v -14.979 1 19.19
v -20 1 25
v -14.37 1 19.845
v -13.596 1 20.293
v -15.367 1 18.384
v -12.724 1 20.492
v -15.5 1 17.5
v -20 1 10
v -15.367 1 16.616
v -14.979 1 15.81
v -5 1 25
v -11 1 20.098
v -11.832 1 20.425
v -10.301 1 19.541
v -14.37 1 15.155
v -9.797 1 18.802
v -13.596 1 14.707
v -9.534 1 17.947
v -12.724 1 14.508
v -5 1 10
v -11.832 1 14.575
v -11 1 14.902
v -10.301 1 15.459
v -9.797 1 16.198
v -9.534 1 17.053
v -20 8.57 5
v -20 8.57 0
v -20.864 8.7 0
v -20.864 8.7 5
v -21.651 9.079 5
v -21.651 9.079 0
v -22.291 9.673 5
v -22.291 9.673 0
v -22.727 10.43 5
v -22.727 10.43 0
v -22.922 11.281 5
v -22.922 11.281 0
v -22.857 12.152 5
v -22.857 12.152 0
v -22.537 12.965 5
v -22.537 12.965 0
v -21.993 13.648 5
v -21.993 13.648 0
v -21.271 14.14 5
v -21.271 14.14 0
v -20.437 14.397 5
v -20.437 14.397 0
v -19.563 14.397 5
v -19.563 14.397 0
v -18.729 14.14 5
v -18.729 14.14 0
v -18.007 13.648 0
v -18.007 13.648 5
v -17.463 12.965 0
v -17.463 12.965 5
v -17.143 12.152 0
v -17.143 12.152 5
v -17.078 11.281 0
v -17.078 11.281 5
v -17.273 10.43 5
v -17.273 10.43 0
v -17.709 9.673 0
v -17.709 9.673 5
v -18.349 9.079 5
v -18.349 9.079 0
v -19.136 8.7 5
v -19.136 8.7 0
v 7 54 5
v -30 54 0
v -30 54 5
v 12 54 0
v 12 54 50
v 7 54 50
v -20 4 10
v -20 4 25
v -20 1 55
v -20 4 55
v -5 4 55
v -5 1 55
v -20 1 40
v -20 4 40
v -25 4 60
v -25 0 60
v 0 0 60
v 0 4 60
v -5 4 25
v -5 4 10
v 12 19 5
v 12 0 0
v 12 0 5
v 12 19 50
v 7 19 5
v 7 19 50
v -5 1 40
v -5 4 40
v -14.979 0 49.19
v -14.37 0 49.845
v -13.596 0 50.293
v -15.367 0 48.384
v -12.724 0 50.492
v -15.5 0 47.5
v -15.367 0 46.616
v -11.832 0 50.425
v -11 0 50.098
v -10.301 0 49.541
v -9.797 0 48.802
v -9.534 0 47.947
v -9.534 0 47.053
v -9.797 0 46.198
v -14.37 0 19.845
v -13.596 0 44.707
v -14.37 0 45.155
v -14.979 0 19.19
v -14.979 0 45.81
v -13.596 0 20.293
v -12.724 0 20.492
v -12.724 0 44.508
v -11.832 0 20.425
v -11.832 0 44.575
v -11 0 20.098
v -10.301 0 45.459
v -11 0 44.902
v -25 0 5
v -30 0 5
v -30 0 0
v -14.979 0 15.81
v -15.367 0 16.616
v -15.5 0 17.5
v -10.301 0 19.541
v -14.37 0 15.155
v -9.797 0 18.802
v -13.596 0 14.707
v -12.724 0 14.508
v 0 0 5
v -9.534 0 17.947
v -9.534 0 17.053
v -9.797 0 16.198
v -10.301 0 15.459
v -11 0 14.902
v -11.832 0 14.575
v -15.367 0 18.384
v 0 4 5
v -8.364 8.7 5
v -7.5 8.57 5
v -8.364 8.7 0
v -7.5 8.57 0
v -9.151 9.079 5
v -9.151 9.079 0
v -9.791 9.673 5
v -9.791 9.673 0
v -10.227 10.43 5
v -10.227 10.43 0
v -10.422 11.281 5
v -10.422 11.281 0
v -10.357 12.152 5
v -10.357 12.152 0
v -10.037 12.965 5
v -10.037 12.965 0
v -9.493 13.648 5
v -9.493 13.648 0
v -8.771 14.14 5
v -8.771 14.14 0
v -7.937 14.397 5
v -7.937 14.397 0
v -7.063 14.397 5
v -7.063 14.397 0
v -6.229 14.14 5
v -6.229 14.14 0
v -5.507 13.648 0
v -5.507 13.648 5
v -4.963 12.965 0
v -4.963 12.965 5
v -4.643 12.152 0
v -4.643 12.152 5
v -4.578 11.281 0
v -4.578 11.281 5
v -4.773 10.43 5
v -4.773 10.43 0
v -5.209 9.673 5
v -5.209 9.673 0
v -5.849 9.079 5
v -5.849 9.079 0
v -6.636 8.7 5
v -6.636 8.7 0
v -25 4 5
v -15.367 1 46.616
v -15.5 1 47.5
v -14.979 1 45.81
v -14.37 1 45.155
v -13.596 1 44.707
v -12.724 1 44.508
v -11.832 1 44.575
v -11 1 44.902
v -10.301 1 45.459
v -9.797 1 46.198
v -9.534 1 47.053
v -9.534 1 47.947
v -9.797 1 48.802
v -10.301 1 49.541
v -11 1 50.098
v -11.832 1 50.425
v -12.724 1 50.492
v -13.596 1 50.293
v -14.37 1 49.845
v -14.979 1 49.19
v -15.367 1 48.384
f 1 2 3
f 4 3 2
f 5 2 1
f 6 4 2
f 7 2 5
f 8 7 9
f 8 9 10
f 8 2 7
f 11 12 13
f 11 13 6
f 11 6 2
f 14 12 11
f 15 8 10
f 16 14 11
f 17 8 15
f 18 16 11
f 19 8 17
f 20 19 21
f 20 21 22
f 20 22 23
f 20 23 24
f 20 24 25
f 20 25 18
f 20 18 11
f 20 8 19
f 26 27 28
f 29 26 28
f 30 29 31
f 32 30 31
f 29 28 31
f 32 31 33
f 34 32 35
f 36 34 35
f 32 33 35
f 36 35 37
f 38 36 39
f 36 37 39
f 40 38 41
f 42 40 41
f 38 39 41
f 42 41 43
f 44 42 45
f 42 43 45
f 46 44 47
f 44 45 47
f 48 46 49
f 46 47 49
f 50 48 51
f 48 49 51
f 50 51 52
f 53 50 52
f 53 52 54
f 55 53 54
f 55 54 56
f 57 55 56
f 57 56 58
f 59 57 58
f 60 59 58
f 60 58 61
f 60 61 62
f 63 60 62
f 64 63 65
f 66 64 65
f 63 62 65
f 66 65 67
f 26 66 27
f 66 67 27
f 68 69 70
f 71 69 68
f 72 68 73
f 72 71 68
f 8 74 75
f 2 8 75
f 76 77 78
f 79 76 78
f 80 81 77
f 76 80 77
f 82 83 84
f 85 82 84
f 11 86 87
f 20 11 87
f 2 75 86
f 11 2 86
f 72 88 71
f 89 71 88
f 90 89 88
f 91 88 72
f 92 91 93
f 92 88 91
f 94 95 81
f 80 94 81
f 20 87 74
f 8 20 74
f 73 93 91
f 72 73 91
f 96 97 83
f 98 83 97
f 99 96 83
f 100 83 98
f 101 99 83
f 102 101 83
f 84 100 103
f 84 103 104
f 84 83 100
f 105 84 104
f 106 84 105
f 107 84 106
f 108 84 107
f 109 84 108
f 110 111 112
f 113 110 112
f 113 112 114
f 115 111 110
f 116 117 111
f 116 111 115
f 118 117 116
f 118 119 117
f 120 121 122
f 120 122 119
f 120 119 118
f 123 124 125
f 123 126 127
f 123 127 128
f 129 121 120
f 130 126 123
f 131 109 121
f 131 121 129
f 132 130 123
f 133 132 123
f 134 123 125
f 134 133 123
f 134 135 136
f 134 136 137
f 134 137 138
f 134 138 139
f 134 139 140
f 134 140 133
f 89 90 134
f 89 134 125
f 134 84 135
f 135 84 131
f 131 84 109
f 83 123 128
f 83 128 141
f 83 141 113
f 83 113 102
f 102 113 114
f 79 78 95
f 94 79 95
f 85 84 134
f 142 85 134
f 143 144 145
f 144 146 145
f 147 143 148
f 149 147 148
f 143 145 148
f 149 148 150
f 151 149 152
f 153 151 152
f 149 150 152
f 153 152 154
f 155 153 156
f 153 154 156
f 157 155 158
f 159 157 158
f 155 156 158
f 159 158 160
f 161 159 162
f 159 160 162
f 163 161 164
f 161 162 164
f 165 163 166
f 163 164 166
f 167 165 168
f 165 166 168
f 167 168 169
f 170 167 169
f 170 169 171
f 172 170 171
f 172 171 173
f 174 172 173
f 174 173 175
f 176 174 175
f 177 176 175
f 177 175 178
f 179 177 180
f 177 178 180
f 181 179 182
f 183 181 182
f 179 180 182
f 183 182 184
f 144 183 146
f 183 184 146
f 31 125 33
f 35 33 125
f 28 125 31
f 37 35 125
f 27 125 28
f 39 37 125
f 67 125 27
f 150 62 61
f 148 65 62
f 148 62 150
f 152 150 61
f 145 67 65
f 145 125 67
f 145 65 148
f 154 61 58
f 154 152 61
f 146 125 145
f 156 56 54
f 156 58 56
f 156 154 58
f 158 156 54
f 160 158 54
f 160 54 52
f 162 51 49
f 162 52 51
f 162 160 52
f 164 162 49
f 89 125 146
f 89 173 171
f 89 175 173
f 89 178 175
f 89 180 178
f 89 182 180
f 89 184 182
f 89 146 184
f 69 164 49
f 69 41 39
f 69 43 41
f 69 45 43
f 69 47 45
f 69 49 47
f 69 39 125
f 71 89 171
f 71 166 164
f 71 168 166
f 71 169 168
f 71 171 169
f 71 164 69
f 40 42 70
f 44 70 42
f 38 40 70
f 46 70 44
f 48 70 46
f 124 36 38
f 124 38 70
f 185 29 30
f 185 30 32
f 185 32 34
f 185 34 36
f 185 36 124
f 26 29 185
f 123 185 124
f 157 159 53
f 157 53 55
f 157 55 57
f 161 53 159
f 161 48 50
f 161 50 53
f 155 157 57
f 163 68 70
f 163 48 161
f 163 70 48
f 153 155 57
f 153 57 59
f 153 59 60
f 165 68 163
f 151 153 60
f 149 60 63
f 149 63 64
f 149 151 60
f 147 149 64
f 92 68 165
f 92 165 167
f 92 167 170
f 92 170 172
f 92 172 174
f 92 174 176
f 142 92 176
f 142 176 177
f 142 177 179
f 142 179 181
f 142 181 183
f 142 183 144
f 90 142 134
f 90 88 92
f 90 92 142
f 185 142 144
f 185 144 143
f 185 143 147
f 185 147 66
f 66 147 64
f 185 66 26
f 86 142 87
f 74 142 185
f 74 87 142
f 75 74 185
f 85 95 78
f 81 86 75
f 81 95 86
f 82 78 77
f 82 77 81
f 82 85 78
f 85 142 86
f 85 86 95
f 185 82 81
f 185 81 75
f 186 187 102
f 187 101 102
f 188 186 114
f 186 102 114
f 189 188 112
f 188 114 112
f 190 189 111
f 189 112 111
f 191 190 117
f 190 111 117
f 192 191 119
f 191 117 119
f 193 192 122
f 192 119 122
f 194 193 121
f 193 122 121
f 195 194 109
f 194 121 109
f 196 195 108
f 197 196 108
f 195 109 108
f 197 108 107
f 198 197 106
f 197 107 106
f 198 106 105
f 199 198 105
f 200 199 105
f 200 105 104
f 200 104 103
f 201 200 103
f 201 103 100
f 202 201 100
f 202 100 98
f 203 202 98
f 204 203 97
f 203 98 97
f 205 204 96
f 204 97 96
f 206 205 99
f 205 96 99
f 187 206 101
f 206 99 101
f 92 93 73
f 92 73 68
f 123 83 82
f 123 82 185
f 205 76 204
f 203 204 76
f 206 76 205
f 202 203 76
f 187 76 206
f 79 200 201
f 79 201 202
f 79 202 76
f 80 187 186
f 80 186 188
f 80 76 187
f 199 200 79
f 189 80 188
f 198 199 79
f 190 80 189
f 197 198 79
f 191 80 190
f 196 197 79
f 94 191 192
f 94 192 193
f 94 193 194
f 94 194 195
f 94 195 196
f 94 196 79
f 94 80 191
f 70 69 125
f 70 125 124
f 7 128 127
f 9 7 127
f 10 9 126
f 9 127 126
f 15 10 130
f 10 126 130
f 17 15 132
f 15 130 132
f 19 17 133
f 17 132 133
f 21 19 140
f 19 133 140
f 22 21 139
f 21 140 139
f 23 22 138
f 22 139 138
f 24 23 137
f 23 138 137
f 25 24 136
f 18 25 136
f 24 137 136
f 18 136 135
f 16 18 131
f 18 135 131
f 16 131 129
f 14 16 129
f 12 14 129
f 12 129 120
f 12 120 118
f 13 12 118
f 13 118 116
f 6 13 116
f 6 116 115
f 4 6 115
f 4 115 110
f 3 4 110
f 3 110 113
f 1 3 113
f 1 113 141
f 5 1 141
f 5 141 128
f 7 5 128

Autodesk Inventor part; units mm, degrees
ref_plane "YZ Plane" through (0, 0, 0) normal (1, 0, 0) x (0, 1, 0)
ref_plane "XZ Plane" through (0, 0, 0) normal (0, 1, 0) x (-1, 0, 0)
ref_plane "XY Plane" through (0, 0, 0) normal (0, 0, 1) x (1, 0, 0)
sketch "BackwithHoles" plane through (0, 0, 0) normal (0, 1, 0) x (-1, 0, 0)
  line L0 (0, 0) -> (25, 0)
  line L1 (25, 0) -> (25, 60)
  line L2 (25, 60) -> (0, 60)
  line L3 (0, 60) -> (0, 0)
  circle A0 centre (12.5, 47.5) radius 3
  circle A1 centre (12.5, 17.5) radius 3
  dimension "d8" = 25
  dimension "d9" = 60
  dimension "d10" = 6
  dimension "d11" = 6
  dimension "d12" = 12.5
  dimension "d13" = 12.5
  dimension "d14" = 12.5
  dimension "d15" = 17.5
extrude "Extrusion1" add sketch "BackwithHoles" along normal blind 4
sketch "Bottom" plane through (0, 4, 0) normal (0, 1, 0) x (1, 0, 0)
  line L0 (0, -60) -> (0, 0) projected
  line L1 (0, 0) -> (-25, 0) projected
  line L2 (0, -5) -> (-25, -5)
  line L3 (-25, -5) -> (-25, 0)
  line L4 (-25, 0) -> (0, 0)
  line L5 (0, 0) -> (0, -5)
  dimension "d18" = 5
extrude "Extrusion2" add sketch "Bottom" along normal blind 15
sketch "HolesonBottom" plane through (-25, 4, 5) normal (0, 0, 1) x (1, 0, 0)
  circle A0 centre (17.5, 7.5) radius 2.5
  circle A1 centre (5, 7.5) radius 2.5
  line L0 (25, 0) -> (25, 15) projected
  line L1 (0, 0) -> (0, 15) projected
  line L2 (0, 0) -> (25, 0) projected
  point P0 (25, -4)
  dimension "d21" = 5
  dimension "d22" = 5
  dimension "d23" = 7.5
  dimension "d24" = 5
  dimension "d25" = 7.5
  dimension "d26" = 7.5
  dimension "d27" = 12.5
hole "Hole1" at (-7.5, 11.5, 5) at (-20, 11.5, 5) direction (0, 0, -1) diameter 5.86 end through all
sketch "TopSquare" plane through (0, 4, 0) normal (0, 1, 0) x (1, 0, 0)
  line L0 (-20, -55) -> (-5, -55)
  line L1 (-5, -55) -> (-5, -40)
  line L2 (-5, -40) -> (-20, -40)
  line L3 (-20, -40) -> (-20, -55)
  line L4 (-25, -60) -> (0, -60) projected
  line L5 (0, -60) -> (0, -5) projected
  point P0 (0, 0)
  dimension "d35" = 5
  dimension "d36" = 15
  dimension "d37" = 15
  dimension "d38" = 5
extrude "Extrusion3" cut sketch "TopSquare" against normal blind 3
sketch "BottomSquare" plane through (0, 4, 0) normal (0, 1, 0) x (1, 0, 0)
  line L0 (-20, -25) -> (-5, -25)
  line L1 (-5, -25) -> (-5, -10)
  line L2 (-5, -10) -> (-20, -10)
  line L3 (-20, -10) -> (-20, -25)
  line L4 (0, -60) -> (0, -5) projected
  line L5 (-20, -40) -> (-5, -40) projected
  point P0 (0, 0)
  point P1 (-20, -40)
  dimension "d41" = 15
  dimension "d42" = 15
  dimension "d43" = 5
  dimension "d44" = 30
extrude "Extrusion4" cut sketch "BottomSquare" against normal blind 3
sketch "BottomExtrusion" plane through (0, 19, 0) normal (0, 1, 0) x (1, 0, 0)
  line L0 (0, 0) -> (-25, 0) projected
  line L1 (-25, 0) -> (-25, -5) projected
  line L2 (0, 0) -> (-25, 0)
  line L3 (-25, 0) -> (-25, -5)
  line L4 (-25, -5) -> (0, -5)
  line L5 (0, -5) -> (0, 0)
extrude "Extrusion7" add sketch "BottomExtrusion" along normal blind 23
sketch "BottomExteriorExtrusion" plane through (0, 0, 60) normal (1, 0, 0) x (0, 0, -1)
  line L0 (55, 42) -> (60, 42) projected
  line L1 (60, 0) -> (55, 0)
  line L2 (55, 0) -> (55, 42)
  line L3 (55, 42) -> (60, 42)
  line L4 (60, 42) -> (60, 0)
extrude "Extrusion8" add sketch "BottomExteriorExtrusion" along normal blind 12
sketch "ContainingWall" plane through (-25, 4, 5) normal (0, 0, 1) x (1, 0, 0)
  line L0 (37, -4) -> (37, 38) projected
  line L1 (0, 38) -> (37, 38) projected
  line L2 (37, 15) -> (32, 15)
  line L3 (32, 15) -> (32, 38)
  line L4 (32, 38) -> (37, 38)
  line L5 (37, 38) -> (37, 15)
  point P0 (25, -4)
  dimension "d56" = 5
  dimension "d57" = 23
extrude "Extrusion9" add sketch "ContainingWall" along normal blind 45
sketch "ContainingWallExtension" plane through (0, 42, 0) normal (0, 1, 0) x (1, 0, 0)
  line L0 (12, 0) -> (12, -50) projected
  line L1 (7, -50) -> (12, -50) projected
  line L2 (12, -50) -> (7, -50)
  line L3 (-25, -5) -> (7, -5) projected
  line L4 (7, -50) -> (7, -5)
  line L5 (7, -5) -> (-25, -5)
  line L6 (-25, 0) -> (12, 0) projected
  line L7 (-25, -5) -> (-25, 0)
  line L8 (-25, 0) -> (12, 0)
  line L9 (12, 0) -> (12, -50)
  point P0 (0, 0)
extrude "Extrusion10" add sketch "ContainingWallExtension" along normal blind 12
sketch "AnteriorBottomExtension" plane through (-25, 0, 0) normal (-1, 0, 0) x (0, 0, 1)
  line L0 (5, 0) -> (0, 0) projected
  line L1 (0, 0) -> (0, 54) projected
  line L2 (0, 0) -> (0, 54)
  line L3 (5, 19) -> (5, 54) projected
  line L4 (0, 54) -> (5, 54)
  line L5 (5, 19) -> (5, 0) projected
  line L6 (5, 54) -> (5, 0)
  line L7 (5, 0) -> (0, 0)
extrude "Extrusion11" add sketch "AnteriorBottomExtension" along normal blind 5
properties part number "Slider" material "Wood (Maple)"
